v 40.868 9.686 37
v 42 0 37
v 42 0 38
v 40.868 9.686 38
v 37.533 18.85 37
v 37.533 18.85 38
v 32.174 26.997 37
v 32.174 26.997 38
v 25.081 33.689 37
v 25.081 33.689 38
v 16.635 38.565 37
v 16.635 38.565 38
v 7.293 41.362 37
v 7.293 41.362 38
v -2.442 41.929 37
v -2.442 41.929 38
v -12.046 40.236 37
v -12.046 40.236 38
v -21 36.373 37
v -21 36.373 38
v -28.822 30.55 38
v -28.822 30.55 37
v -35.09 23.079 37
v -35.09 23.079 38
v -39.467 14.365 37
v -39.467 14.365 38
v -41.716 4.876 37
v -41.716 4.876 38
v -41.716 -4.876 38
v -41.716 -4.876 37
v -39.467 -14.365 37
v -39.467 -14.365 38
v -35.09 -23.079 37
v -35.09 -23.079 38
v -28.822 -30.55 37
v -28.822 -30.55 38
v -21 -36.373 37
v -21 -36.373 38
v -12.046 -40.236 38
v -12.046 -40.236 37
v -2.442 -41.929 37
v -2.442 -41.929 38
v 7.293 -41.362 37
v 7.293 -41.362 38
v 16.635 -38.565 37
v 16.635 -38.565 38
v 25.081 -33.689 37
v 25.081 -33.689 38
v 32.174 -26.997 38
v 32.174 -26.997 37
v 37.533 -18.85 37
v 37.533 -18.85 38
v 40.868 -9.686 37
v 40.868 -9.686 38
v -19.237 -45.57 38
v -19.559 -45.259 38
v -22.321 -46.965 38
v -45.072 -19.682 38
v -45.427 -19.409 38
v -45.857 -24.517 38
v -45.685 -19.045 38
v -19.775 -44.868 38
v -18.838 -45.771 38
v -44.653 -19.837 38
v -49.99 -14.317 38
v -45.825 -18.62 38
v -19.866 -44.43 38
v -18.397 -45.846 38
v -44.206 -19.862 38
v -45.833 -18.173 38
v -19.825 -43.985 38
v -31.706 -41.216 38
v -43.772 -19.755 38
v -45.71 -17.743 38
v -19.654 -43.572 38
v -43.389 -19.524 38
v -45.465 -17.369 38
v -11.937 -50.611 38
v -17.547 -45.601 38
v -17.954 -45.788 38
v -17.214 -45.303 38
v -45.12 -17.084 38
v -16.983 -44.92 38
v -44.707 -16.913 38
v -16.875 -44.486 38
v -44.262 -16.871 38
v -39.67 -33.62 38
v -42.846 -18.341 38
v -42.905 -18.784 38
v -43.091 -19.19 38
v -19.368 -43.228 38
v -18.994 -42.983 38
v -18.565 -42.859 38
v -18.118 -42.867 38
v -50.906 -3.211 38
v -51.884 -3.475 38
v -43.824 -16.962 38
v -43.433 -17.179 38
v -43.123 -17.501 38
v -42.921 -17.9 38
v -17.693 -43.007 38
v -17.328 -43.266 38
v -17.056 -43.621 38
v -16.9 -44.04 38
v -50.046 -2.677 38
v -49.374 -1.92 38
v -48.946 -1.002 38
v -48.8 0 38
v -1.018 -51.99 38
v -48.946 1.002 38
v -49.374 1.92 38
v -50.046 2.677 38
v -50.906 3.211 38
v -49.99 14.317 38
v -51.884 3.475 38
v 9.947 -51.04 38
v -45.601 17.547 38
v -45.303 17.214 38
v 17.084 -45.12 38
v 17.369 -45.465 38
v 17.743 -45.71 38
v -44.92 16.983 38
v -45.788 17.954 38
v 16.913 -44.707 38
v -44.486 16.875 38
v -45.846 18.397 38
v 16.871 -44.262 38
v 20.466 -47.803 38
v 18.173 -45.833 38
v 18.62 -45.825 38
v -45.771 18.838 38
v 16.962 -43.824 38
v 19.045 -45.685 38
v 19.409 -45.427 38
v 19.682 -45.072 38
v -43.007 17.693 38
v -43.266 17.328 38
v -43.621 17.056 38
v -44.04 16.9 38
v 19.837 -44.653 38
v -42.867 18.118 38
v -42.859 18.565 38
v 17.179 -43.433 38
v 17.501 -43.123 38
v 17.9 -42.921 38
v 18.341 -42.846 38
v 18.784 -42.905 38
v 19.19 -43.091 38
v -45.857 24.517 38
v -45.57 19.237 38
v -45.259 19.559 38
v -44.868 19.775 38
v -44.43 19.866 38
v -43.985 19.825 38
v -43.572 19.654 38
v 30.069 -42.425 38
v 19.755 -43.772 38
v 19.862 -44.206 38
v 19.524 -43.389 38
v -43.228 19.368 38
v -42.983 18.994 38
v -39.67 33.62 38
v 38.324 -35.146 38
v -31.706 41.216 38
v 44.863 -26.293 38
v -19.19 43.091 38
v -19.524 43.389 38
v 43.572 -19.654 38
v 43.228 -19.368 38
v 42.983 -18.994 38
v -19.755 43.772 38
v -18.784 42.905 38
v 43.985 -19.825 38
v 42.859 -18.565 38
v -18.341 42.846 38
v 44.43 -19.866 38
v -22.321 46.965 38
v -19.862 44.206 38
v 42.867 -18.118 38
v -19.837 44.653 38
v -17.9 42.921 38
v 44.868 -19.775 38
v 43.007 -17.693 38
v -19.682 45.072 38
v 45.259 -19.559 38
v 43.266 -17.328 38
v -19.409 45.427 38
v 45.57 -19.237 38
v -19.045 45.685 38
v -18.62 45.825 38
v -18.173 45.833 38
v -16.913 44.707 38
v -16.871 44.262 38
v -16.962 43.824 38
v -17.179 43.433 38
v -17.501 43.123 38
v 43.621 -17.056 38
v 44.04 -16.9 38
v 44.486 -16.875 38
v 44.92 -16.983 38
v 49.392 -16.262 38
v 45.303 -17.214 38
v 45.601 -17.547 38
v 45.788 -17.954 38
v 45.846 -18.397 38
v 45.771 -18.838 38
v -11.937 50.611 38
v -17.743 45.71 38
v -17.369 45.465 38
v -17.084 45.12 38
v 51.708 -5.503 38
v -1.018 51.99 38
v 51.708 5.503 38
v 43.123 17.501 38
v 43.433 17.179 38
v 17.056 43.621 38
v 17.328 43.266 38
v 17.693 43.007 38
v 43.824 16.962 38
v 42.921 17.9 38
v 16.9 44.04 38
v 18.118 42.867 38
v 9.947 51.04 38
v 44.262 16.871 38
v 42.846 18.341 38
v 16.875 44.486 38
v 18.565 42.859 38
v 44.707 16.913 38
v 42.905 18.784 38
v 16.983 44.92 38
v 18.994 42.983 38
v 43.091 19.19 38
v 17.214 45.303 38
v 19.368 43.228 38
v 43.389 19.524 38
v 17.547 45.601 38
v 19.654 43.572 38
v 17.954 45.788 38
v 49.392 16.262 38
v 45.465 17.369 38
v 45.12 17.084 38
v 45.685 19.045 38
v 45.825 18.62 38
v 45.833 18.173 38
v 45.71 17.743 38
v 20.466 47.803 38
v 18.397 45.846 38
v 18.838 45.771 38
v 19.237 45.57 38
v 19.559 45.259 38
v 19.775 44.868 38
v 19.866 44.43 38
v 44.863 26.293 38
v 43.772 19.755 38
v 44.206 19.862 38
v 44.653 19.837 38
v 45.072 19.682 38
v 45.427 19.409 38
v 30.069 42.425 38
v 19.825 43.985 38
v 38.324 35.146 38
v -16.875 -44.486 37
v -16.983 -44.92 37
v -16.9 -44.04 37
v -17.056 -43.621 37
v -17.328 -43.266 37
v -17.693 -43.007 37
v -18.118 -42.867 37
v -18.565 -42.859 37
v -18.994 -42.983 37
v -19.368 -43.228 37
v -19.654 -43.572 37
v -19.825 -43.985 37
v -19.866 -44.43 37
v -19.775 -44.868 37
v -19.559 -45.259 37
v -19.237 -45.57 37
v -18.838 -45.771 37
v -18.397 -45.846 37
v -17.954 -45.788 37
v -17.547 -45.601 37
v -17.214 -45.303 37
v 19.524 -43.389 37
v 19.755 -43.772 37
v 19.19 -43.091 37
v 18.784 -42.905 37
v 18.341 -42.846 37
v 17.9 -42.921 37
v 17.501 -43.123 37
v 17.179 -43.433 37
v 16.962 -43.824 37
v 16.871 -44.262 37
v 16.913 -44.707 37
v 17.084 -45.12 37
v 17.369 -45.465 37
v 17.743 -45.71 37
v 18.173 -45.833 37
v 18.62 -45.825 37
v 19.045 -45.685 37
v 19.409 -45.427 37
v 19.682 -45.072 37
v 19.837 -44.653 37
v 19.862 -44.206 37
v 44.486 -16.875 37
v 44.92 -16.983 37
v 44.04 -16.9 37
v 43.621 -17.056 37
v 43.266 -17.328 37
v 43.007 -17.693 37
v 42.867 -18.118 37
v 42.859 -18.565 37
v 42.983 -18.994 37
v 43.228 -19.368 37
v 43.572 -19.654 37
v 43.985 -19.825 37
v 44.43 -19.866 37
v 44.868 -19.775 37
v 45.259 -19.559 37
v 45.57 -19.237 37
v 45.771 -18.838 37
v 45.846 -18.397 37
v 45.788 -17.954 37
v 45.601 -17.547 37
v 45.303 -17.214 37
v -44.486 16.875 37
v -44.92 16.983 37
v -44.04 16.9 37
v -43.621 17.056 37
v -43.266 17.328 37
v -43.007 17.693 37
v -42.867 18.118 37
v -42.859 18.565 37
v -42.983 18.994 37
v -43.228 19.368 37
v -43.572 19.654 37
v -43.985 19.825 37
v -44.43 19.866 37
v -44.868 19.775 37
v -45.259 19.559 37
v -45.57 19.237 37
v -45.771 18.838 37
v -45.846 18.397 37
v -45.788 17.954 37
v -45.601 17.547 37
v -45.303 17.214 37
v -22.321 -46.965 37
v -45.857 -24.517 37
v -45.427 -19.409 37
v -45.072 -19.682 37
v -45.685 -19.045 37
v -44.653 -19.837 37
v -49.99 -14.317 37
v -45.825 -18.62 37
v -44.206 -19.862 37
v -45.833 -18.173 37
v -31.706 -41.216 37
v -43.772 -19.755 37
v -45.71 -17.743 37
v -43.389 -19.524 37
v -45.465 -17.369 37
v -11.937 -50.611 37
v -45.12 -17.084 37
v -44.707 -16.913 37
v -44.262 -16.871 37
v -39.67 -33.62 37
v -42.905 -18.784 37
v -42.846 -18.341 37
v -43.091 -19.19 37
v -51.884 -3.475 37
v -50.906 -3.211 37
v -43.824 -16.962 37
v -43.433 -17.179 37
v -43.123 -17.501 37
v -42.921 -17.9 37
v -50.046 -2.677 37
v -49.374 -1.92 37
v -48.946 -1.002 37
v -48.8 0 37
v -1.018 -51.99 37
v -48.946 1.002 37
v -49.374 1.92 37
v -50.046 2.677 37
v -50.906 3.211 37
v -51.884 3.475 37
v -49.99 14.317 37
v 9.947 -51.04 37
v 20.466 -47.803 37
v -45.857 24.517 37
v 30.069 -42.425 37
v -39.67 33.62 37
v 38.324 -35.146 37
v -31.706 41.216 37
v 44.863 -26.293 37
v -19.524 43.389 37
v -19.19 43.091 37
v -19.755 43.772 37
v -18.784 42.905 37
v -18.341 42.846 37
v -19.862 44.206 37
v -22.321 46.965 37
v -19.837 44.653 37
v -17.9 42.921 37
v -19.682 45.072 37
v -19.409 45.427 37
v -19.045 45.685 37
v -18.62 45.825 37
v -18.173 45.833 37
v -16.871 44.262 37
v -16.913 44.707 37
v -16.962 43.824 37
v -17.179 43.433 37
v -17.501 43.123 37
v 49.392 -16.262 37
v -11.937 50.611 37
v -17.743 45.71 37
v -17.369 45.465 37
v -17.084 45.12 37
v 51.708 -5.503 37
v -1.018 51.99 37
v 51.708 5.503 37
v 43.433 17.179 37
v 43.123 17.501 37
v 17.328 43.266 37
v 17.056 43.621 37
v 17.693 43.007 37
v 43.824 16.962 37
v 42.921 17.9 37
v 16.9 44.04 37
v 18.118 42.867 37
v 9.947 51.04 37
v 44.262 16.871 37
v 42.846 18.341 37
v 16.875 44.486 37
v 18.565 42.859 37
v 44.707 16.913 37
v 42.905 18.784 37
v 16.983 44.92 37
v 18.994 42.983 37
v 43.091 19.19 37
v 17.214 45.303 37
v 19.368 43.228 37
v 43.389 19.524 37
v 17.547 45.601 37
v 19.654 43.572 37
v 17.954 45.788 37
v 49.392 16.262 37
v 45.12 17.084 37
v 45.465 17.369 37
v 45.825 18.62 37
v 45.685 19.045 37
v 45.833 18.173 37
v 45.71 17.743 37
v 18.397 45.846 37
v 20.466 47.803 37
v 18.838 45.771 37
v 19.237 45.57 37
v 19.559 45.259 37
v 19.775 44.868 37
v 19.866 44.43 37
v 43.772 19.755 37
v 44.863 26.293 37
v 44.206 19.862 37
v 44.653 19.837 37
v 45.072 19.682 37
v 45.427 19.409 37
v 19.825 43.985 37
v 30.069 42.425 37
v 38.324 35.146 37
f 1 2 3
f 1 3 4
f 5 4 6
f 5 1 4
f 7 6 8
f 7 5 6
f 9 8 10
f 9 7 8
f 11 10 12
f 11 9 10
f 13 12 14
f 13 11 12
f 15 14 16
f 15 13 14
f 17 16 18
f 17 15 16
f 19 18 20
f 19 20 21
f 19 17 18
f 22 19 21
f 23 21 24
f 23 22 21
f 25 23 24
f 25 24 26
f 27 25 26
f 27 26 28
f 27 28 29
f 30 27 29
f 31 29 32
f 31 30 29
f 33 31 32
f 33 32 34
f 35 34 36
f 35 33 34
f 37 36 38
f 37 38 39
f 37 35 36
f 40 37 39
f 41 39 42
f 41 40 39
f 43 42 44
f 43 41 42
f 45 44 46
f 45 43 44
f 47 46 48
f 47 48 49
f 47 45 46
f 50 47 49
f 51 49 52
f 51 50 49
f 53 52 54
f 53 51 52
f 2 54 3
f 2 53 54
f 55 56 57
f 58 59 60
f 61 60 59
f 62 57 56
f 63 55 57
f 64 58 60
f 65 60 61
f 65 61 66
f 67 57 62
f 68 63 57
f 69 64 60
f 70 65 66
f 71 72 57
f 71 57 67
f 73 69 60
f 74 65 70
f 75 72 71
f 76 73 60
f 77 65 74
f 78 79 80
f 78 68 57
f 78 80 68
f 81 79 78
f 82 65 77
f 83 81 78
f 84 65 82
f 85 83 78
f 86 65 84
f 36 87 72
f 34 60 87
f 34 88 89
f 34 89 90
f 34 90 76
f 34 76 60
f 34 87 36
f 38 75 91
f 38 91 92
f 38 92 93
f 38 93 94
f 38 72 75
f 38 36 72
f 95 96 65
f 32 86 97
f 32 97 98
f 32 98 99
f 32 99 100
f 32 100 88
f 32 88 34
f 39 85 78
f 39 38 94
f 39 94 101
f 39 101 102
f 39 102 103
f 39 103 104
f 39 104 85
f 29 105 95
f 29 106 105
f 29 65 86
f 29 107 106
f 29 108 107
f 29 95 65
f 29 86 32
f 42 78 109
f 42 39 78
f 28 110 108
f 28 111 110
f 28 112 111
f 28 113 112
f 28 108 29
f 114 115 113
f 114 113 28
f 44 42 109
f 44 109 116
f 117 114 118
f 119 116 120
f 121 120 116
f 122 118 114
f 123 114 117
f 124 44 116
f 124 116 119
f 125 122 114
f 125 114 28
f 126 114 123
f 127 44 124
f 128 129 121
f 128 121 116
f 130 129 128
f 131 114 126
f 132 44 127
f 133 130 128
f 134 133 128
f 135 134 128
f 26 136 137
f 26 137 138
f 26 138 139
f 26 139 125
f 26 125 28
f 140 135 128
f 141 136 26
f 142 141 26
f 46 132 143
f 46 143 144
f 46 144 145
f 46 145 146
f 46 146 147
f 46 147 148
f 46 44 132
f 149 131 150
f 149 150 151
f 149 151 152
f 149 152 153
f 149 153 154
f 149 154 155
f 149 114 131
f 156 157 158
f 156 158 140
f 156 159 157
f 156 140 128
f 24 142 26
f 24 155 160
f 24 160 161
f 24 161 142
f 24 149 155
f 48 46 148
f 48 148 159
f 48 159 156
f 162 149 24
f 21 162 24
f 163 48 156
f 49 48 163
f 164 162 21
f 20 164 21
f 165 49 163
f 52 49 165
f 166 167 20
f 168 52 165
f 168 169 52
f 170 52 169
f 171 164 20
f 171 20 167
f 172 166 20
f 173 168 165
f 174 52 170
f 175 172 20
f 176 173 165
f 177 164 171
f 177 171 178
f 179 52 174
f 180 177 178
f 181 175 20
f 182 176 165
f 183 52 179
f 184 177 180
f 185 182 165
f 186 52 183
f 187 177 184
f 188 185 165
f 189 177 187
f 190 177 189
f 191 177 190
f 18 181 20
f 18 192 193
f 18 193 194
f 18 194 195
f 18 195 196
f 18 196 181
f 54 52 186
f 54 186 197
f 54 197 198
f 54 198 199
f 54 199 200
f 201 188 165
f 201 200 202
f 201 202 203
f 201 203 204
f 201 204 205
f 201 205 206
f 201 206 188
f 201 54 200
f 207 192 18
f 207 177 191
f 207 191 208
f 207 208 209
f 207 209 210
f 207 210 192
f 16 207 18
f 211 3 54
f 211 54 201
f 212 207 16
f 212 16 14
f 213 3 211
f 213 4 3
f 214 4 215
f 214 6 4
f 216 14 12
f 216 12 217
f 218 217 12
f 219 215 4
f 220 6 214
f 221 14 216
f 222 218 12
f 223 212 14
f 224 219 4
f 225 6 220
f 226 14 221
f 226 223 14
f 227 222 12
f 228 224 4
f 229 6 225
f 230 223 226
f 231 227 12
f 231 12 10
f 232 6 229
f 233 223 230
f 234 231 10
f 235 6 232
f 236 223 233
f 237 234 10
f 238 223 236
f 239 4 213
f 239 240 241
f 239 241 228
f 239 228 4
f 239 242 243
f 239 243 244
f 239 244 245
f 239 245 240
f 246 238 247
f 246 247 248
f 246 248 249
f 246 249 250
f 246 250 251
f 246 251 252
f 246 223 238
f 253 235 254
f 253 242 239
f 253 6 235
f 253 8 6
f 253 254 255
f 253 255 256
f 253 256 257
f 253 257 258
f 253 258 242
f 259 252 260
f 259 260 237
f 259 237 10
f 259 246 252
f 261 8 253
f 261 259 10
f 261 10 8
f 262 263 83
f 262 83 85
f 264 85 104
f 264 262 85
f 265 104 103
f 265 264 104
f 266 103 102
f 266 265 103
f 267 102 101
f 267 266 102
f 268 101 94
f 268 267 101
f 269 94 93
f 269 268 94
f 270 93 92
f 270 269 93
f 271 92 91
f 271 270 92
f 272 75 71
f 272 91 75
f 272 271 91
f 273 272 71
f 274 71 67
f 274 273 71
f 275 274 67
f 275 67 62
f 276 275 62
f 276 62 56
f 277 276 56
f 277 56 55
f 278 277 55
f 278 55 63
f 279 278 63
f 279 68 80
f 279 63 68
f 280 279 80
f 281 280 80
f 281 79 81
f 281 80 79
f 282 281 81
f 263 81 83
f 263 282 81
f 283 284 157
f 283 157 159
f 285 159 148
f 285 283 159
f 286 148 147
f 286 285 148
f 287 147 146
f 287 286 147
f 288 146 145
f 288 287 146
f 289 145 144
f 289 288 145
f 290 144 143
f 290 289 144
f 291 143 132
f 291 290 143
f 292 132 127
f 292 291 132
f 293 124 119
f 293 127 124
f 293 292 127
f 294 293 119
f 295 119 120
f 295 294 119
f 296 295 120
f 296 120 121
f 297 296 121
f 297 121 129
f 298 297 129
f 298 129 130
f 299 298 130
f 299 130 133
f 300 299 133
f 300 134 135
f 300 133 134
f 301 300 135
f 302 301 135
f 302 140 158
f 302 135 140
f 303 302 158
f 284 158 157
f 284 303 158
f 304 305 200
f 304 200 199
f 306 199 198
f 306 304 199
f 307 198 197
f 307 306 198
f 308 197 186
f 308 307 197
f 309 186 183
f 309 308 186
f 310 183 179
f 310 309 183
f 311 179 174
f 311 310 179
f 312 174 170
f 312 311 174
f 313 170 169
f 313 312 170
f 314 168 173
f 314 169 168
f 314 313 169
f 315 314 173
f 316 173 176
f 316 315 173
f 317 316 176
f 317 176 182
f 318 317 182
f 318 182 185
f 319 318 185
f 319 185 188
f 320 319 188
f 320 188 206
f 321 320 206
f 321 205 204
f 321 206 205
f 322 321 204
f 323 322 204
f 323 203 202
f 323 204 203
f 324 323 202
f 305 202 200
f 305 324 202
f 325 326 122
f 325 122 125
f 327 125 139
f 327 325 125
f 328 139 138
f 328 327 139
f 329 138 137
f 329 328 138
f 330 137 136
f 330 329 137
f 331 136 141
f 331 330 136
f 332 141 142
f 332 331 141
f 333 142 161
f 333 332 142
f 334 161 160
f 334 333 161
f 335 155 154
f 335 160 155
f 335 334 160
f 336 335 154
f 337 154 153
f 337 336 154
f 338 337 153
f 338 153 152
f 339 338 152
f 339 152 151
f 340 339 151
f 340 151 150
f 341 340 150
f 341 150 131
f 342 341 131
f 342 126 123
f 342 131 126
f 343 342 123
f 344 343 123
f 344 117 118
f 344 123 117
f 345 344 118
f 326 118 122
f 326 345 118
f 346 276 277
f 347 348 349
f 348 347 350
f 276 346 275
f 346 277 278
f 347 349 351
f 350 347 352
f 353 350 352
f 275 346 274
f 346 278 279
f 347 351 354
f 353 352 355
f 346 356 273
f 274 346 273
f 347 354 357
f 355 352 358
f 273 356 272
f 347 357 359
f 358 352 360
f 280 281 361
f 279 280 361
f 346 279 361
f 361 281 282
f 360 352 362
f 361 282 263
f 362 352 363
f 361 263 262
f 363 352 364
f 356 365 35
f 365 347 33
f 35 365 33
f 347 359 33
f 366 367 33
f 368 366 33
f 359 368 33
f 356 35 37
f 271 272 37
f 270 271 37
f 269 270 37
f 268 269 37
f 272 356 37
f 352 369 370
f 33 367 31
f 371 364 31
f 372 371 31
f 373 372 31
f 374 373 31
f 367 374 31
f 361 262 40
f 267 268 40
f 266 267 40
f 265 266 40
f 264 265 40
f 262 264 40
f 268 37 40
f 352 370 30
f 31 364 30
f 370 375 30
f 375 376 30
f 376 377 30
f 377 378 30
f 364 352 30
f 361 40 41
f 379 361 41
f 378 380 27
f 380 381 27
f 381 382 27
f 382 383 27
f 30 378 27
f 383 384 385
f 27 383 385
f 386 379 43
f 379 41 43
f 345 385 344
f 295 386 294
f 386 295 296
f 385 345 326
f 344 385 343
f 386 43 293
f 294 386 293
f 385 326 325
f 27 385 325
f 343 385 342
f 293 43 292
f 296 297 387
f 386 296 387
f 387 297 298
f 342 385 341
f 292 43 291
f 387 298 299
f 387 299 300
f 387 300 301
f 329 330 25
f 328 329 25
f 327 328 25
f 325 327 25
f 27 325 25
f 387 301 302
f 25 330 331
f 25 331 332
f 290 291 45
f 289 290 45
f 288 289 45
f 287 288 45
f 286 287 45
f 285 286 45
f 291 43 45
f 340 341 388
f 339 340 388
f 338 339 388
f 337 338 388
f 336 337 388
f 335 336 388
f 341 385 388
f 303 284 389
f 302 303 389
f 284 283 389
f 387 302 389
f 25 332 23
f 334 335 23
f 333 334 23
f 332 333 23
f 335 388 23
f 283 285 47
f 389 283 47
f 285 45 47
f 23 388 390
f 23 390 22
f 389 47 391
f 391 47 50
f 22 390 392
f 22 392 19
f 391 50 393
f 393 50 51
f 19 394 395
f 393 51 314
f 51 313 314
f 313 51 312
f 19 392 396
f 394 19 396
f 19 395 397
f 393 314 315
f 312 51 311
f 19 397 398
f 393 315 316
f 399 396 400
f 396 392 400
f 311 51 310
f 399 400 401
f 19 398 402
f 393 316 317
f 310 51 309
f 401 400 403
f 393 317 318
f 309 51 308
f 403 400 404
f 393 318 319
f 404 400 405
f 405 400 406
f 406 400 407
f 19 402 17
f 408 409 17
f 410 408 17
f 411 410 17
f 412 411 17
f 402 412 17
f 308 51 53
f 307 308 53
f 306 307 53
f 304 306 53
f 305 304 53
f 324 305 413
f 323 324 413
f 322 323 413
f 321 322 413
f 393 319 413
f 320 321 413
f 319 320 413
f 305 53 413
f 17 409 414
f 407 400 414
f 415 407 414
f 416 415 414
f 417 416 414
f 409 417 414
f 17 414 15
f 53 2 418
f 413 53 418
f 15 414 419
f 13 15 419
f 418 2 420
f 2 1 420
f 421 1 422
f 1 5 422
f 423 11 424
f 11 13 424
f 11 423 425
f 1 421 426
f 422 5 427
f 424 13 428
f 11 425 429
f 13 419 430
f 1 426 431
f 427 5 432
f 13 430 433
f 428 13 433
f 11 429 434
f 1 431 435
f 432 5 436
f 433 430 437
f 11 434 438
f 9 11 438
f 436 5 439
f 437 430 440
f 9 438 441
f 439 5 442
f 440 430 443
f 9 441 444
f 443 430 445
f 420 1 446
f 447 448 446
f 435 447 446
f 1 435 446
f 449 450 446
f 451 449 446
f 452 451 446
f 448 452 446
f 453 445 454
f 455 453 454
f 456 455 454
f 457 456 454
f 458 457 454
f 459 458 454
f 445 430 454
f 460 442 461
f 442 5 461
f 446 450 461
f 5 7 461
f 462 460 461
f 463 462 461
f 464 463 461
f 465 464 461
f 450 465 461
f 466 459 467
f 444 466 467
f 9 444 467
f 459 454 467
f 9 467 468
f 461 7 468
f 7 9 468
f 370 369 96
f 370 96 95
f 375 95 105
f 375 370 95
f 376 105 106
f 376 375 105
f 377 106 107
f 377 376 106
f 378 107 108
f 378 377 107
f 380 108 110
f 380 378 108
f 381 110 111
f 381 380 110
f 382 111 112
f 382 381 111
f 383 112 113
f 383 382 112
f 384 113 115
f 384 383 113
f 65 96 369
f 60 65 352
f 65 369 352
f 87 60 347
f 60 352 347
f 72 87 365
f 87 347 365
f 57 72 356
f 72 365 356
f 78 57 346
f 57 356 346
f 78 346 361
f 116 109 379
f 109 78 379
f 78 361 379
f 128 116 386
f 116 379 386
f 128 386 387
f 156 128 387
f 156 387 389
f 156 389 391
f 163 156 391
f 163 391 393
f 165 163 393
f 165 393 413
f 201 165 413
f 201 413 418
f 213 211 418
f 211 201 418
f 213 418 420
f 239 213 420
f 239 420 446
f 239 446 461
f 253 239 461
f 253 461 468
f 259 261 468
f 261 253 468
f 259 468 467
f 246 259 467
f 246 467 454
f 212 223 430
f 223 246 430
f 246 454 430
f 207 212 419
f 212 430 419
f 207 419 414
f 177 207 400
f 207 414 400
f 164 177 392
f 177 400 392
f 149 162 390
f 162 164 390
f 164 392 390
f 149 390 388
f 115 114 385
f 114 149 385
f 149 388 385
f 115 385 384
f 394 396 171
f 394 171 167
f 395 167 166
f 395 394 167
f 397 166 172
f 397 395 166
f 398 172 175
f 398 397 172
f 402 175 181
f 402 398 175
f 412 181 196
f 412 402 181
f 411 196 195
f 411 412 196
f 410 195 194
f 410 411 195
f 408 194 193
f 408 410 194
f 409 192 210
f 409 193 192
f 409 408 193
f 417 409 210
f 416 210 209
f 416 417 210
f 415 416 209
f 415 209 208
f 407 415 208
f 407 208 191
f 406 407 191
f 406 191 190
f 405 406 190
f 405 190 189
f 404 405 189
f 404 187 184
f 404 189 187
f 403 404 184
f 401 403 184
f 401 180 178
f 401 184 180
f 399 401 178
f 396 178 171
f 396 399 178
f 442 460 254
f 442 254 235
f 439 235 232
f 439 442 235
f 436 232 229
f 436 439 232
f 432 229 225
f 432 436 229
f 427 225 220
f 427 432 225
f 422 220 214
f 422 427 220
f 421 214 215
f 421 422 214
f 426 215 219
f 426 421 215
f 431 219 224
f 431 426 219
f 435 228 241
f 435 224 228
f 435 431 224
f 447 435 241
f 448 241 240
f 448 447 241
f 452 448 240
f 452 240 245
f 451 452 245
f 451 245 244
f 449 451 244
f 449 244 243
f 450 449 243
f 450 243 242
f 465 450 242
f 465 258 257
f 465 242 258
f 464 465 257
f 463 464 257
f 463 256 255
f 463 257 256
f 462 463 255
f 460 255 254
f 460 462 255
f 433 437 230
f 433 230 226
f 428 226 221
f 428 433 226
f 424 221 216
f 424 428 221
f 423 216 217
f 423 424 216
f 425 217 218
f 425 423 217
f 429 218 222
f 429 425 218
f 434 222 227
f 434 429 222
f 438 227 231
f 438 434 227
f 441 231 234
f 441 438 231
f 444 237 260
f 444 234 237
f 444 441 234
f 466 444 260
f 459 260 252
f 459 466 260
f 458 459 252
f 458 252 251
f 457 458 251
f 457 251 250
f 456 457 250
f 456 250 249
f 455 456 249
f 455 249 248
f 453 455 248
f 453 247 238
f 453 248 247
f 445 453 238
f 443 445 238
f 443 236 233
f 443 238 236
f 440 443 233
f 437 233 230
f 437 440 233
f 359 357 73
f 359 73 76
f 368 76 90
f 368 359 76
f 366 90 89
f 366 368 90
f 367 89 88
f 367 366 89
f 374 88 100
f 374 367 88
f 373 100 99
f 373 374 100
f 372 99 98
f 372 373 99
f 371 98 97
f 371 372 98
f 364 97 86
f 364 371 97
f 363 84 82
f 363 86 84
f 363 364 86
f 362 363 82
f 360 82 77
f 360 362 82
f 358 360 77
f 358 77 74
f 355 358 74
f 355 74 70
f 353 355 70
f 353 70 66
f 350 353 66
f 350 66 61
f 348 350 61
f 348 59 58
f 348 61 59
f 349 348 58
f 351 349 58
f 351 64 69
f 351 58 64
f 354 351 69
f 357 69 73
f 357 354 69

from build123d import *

# Parameters (mm, degrees)
CYLINDER345_R               = 3.5
CYLINDER345_DEPTH           = 20
CYLINDER339_R               = 1.5
CYLINDER339_DEPTH           = 10
CYLINDER339_PLACEMENT_ANGLE = 67.5
CYLINDER340_R               = 1.5
CYLINDER340_DEPTH           = 10
CYLINDER340_PLACEMENT_ANGLE = 112.5
CYLINDER343_R               = 1.5
CYLINDER343_DEPTH           = 10
CYLINDER343_PLACEMENT_ANGLE = 157.5
CYLINDER341_R               = 1.5
CYLINDER341_DEPTH           = 10
CYLINDER341_PLACEMENT_ANGLE = 202.5
CYLINDER338_R               = 1.5
CYLINDER338_DEPTH           = 10
CYLINDER338_PLACEMENT_ANGLE = 112.500001
CYLINDER344_R               = 1.5
CYLINDER344_DEPTH           = 10
CYLINDER344_PLACEMENT_ANGLE = 67.5
CYLINDER342_R               = 1.5
CYLINDER342_DEPTH           = 10
CYLINDER342_PLACEMENT_ANGLE = 22.5
CYLINDER337_R               = 1.5
CYLINDER337_DEPTH           = 10
CYLINDER337_PLACEMENT_ANGLE = 22.5
TUBE033_R                   = 52
TUBE033_R_2                 = 42
TUBE033_DEPTH               = 1


with BuildPart() as v_lec345:
    # Cylinder345 → Cylinder345 (new body)
    with BuildSketch(Plane(origin=(-52.3, 0, 29), x_dir=(1, 0, 0), z_dir=(0, 0, 1))):
        Circle(CYLINDER345_R)
    extrude(amount=CYLINDER345_DEPTH)


with BuildPart() as v_lec339:
    # Cylinder339 → Cylinder339 (new body)
    with BuildSketch(Plane.XY):
        Circle(CYLINDER339_R)
    extrude(amount=CYLINDER339_DEPTH)


with BuildPart() as v_lec339_1:
    # Cylinder339 placement: moved
    add(v_lec339.part.moved(Location((44.346218, -18.368805, 35.5))).rotate(Axis((44.346218, -18.368805, 35.5), (0, 0, 1)), CYLINDER339_PLACEMENT_ANGLE))


with BuildPart() as v_lec340:
    # Cylinder340 → Cylinder340 (new body)
    with BuildSketch(Plane.XY):
        Circle(CYLINDER340_R)
    extrude(amount=CYLINDER340_DEPTH)


with BuildPart() as v_lec340_1:
    # Cylinder340 placement: moved
    add(v_lec340.part.moved(Location((44.346218, 18.368805, 35.5))).rotate(Axis((44.346218, 18.368805, 35.5), (0, 0, 1)), CYLINDER340_PLACEMENT_ANGLE))


with BuildPart() as v_lec343:
    # Cylinder343 → Cylinder343 (new body)
    with BuildSketch(Plane.XY):
        Circle(CYLINDER343_R)
    extrude(amount=CYLINDER343_DEPTH)


with BuildPart() as v_lec343_1:
    # Cylinder343 placement: moved
    add(v_lec343.part.moved(Location((18.368805, 44.346218, 35.5))).rotate(Axis((18.368805, 44.346218, 35.5), (0, 0, 1)), CYLINDER343_PLACEMENT_ANGLE))


with BuildPart() as v_lec341:
    # Cylinder341 → Cylinder341 (new body)
    with BuildSketch(Plane.XY):
        Circle(CYLINDER341_R)
    extrude(amount=CYLINDER341_DEPTH)


with BuildPart() as v_lec341_1:
    # Cylinder341 placement: moved
    add(v_lec341.part.moved(Location((-18.368805, 44.346218, 35.5))).rotate(Axis((-18.368805, 44.346218, 35.5), (0, 0, 1)), CYLINDER341_PLACEMENT_ANGLE))


with BuildPart() as v_lec338:
    # Cylinder338 → Cylinder338 (new body)
    with BuildSketch(Plane.XY):
        Circle(CYLINDER338_R)
    extrude(amount=CYLINDER338_DEPTH)


with BuildPart() as v_lec338_1:
    # Cylinder338 placement: moved
    add(v_lec338.part.moved(Location((-44.346218, 18.368805, 35.5))).rotate(Axis((-44.346218, 18.368805, 35.5), (0, 0, -1)), CYLINDER338_PLACEMENT_ANGLE))


with BuildPart() as v_lec344:
    # Cylinder344 → Cylinder344 (new body)
    with BuildSketch(Plane.XY):
        Circle(CYLINDER344_R)
    extrude(amount=CYLINDER344_DEPTH)


with BuildPart() as v_lec344_1:
    # Cylinder344 placement: moved
    add(v_lec344.part.moved(Location((-44.346218, -18.368805, 35.5))).rotate(Axis((-44.346218, -18.368805, 35.5), (0, 0, -1)), CYLINDER344_PLACEMENT_ANGLE))


with BuildPart() as v_lec342:
    # Cylinder342 → Cylinder342 (new body)
    with BuildSketch(Plane.XY):
        Circle(CYLINDER342_R)
    extrude(amount=CYLINDER342_DEPTH)


with BuildPart() as v_lec342_1:
    # Cylinder342 placement: moved
    add(v_lec342.part.moved(Location((-18.368805, -44.346218, 35.5))).rotate(Axis((-18.368805, -44.346218, 35.5), (0, 0, -1)), CYLINDER342_PLACEMENT_ANGLE))


with BuildPart() as compound253:
    # Cylinder337 → Cylinder337 (new body)
    with BuildSketch(Plane.XY):
        Circle(CYLINDER337_R)
    extrude(amount=CYLINDER337_DEPTH)


with BuildPart() as compound253_1:
    # Cylinder337 placement: moved
    add(compound253.part.moved(Location((18.368805, -44.346218, 35.5))).rotate(Axis((18.368805, -44.346218, 35.5), (0, 0, 1)), CYLINDER337_PLACEMENT_ANGLE))

    # Compound253: union Válec339, Válec340, Válec343, Válec341, Válec338, Válec344, Válec342
    add(v_lec339_1.part)
    add(v_lec340_1.part)
    add(v_lec343_1.part)
    add(v_lec341_1.part)
    add(v_lec338_1.part)
    add(v_lec344_1.part)
    add(v_lec342_1.part)


with BuildPart() as compound253_2:
    # Compound253 placement: moved
    add(compound253_1.part.moved(Location((0, 0, -2))))


with BuildPart() as cut143:
    # Tube033 → Tube033 (new body)
    with BuildSketch(Plane.XY.offset(37)):
        Circle(TUBE033_R)
        Circle(TUBE033_R_2, mode=Mode.SUBTRACT)
    extrude(amount=TUBE033_DEPTH)

    # Cut142: cut Compound253
    add(compound253_2.part, mode=Mode.SUBTRACT)

    # Cut143: cut Válec345
    add(v_lec345.part, mode=Mode.SUBTRACT)


solid = cut143.part
